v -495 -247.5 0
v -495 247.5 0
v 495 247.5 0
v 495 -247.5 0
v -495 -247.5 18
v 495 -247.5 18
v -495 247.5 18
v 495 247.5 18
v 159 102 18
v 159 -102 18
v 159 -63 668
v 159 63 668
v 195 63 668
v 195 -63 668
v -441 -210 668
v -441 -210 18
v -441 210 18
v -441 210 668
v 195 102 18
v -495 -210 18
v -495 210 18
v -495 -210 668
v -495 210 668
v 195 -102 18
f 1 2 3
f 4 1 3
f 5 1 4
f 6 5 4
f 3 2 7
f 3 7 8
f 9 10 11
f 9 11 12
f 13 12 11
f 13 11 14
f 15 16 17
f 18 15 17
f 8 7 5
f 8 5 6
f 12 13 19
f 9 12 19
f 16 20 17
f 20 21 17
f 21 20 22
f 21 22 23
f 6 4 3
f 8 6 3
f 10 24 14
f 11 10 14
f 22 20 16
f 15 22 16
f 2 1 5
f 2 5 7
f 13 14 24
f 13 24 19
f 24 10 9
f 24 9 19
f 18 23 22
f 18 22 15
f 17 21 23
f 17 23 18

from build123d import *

# Parameters (mm, degrees)
F0_W     = 990
F0_H     = 495
F1_DEPTH = 18
F2_W     = 54
F2_H     = 420
F3_DEPTH = 650
F2_W_2   = 36
F2_H_2   = 204
F4_W     = 204
F4_H     = 650
F5_DEPTH = 690.001
F7_DEPTH = 650
F9_DEPTH = 40


# Not quite as in the source:
# - a feature names something its author has since deleted; it is built from what else it names


with BuildPart() as f1:
    # F0 (on Top) → F1 (new body)
    with BuildSketch(Plane.XY):
        Rectangle(F0_W, F0_H)
    extrude(amount=F1_DEPTH)


with BuildPart() as f3:
    # F2 (on face) → F3 (new body)
    with BuildSketch(Plane.XY.offset(18)):
        with Locations((-468, 0)):
            Rectangle(F2_W, F2_H)
    extrude(amount=F3_DEPTH)


with BuildPart() as f3b:
    # F2 (on face) → F3, piece 2 (new body)
    with BuildSketch(Plane.XY.offset(18)):
        with Locations((177, 0)):
            Rectangle(F2_W_2, F2_H_2)
    extrude(amount=F3_DEPTH)


with BuildPart() as f5_tool:
    # F4 (on face) → F5 (new body, through all)
    with BuildSketch(Plane.YZ.offset(195)):
        with Locations((0, 343)):
            Rectangle(F4_W, F4_H)
    extrude(amount=-F5_DEPTH)


with BuildPart() as f3_1:
    add(f3.part)

    # F5: cut by f5_tool
    add(f5_tool.part, mode=Mode.SUBTRACT)

    # F2 (on face) → F7 (join)
    with BuildSketch(Plane.XY.offset(18)):
        with Locations((-468, 0)):
            Rectangle(F2_W, F2_H)
    extrude(amount=F7_DEPTH)


with BuildPart() as f3b_1:
    add(f3b.part)

    # F5: cut by f5_tool
    add(f5_tool.part, mode=Mode.SUBTRACT)


with BuildPart() as f7:
    # F2 (on face) → F7, piece 2 (new body)
    with BuildSketch(Plane.XY.offset(18)):
        with Locations((177, 0)):
            Rectangle(F2_W_2, F2_H_2)
    extrude(amount=F7_DEPTH)

    # F8 (on face) → F9 (cut)
    with BuildSketch(Plane.YZ.offset(195)):
        Polygon((102, 668), (63, 668), (102, 18), align=None)
        Polygon((-102, 18), (-63, 668), (-102, 668), align=None)
    extrude(amount=-F9_DEPTH, mode=Mode.SUBTRACT)


solid = Compound([f1.part, f3_1.part, f7.part])
